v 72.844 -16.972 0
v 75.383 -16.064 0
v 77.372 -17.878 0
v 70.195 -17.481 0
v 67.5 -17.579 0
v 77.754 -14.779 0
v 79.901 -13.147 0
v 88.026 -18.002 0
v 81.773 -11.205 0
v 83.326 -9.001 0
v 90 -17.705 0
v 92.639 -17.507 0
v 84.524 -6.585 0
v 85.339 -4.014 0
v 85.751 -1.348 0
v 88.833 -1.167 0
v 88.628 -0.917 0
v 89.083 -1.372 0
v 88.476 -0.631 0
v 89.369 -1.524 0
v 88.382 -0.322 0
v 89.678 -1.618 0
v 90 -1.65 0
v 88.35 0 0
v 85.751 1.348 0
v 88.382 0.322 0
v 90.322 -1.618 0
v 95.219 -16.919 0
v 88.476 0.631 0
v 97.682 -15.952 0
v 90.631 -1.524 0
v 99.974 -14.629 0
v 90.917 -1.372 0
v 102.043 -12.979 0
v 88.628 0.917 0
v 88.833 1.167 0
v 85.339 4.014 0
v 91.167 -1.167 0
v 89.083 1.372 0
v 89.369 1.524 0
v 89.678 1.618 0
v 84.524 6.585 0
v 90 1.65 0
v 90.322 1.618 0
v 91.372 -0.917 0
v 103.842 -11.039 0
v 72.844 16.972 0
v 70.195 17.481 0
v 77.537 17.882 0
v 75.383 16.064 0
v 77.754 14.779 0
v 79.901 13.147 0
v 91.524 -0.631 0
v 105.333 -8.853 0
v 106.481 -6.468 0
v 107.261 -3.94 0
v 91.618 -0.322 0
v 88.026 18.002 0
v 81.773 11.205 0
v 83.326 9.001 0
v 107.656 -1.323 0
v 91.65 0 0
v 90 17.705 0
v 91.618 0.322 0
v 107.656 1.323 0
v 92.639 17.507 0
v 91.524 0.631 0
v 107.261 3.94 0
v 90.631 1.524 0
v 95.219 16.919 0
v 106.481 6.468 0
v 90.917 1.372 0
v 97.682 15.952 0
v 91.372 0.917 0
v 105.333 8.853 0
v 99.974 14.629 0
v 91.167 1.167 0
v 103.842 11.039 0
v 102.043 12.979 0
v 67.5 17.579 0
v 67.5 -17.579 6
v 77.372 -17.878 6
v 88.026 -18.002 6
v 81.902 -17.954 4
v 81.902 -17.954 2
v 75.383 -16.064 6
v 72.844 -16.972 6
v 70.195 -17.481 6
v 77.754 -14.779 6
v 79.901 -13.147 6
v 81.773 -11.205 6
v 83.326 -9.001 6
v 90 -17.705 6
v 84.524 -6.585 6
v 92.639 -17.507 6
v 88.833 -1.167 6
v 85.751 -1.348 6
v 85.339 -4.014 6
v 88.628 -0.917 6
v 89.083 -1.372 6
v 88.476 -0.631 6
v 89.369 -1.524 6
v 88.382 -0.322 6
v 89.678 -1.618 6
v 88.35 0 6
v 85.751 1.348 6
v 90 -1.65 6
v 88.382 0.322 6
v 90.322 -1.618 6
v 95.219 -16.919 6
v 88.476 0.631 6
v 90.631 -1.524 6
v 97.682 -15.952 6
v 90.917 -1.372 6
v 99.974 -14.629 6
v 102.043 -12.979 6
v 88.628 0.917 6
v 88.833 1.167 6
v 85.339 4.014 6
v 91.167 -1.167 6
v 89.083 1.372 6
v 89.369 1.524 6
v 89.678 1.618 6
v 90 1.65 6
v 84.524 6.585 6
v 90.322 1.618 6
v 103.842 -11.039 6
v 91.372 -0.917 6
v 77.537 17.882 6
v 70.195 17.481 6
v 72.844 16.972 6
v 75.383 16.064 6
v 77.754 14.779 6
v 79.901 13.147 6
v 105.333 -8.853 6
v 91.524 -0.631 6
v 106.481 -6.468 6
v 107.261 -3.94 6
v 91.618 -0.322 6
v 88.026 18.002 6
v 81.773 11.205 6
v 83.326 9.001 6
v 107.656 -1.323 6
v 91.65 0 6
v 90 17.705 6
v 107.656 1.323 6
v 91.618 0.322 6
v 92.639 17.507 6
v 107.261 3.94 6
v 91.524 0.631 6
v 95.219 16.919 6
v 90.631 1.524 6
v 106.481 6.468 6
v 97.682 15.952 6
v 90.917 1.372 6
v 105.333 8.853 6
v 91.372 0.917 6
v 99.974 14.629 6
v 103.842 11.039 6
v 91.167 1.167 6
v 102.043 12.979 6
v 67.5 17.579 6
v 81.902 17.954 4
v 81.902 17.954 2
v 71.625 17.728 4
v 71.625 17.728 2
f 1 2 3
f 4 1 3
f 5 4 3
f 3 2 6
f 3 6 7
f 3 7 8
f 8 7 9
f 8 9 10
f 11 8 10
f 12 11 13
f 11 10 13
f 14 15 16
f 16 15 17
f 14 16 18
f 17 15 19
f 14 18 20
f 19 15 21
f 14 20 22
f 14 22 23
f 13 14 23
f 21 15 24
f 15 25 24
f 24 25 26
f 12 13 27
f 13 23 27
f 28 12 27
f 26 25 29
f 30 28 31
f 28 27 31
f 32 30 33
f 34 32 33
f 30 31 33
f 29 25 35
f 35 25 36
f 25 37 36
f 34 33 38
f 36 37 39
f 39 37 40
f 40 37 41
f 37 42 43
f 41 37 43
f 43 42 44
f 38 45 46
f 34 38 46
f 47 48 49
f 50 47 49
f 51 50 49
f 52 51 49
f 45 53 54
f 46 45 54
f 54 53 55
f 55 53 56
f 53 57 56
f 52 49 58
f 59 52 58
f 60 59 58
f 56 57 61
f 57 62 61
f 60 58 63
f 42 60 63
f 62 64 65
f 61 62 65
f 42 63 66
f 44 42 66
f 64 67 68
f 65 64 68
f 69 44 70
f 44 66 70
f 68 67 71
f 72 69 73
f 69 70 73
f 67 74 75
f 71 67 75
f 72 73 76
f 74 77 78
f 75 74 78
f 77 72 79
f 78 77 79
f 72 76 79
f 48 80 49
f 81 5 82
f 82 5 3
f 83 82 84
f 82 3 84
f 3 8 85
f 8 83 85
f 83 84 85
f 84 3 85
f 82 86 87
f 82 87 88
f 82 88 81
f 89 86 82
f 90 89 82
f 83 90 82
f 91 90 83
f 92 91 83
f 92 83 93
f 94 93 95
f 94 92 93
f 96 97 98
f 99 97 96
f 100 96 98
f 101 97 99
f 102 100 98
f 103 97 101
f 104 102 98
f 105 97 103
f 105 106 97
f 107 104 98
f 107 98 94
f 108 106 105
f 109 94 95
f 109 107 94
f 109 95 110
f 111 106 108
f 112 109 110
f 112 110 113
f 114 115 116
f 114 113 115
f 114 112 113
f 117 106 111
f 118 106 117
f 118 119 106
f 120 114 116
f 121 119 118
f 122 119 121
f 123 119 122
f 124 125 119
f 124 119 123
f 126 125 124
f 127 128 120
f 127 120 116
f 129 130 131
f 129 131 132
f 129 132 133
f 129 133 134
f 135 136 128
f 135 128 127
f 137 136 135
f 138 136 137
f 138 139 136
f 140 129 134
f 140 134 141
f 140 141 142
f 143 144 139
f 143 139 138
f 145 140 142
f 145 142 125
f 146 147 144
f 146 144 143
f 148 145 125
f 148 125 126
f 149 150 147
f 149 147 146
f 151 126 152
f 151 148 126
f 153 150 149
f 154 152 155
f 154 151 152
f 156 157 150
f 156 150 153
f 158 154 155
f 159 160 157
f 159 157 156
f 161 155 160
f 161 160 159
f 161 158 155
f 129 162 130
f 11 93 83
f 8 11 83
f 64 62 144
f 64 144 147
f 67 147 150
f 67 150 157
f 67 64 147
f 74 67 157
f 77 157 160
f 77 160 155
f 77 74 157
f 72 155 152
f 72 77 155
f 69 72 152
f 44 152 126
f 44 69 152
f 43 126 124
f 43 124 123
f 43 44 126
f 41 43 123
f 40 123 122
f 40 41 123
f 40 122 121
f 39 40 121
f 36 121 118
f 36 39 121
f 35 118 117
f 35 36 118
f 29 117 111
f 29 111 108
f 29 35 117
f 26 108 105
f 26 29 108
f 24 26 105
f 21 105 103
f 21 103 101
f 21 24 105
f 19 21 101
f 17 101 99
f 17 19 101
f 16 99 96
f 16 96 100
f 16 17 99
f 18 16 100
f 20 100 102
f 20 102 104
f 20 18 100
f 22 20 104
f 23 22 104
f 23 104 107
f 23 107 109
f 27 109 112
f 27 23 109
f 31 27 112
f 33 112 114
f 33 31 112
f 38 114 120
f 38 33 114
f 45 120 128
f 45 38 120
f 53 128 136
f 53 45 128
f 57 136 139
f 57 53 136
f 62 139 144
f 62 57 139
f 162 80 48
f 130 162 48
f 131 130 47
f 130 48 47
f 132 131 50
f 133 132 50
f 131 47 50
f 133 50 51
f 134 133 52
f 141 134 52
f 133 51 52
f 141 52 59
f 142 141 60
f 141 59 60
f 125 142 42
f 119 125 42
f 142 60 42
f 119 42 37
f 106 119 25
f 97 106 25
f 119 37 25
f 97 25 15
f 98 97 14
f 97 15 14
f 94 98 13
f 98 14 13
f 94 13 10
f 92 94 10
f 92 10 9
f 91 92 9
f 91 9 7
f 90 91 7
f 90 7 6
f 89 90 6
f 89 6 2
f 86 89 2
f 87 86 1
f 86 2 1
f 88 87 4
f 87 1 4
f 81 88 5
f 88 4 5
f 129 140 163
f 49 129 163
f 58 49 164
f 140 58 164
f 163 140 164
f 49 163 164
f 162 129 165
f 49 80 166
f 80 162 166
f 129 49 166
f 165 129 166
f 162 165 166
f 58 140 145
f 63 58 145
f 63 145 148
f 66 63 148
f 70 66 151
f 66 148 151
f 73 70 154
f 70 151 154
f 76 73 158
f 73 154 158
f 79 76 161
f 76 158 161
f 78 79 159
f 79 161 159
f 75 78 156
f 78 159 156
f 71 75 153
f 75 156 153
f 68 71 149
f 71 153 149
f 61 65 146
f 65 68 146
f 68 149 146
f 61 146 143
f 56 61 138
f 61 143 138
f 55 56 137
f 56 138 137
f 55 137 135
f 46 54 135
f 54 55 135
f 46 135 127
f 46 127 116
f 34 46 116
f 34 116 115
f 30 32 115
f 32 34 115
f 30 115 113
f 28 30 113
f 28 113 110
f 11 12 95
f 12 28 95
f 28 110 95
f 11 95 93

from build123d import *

# Parameters (mm, degrees)
SKETCH2_R           = 1.65
BOSS_EXTRUDE1_DEPTH = 6
CUT_EXTRUDE1_DEPTH  = 110.659974352


with BuildPart() as part:
    # Sketch2 → Boss-Extrude1 (new body)
    with BuildSketch(Plane.XY):
        with BuildLine():
            ThreePointArc((90, -18.005197753), (108.005197753, 0), (90, 18.005197753))
            add(Edge.make_bspline(
                [(90, 18.005197753), (87.300427685, 18.005389985), (81.17457593, 17.968478919), (73.674128402, 17.806885767), (68.874876564, 17.634447138), (67.5, 17.578928476)],
                knots=[0.344744853, 0.344744853, 0.344744853, 0.344744853, 0.357984483, 0.374788114, 0.381536428, 0.381536428, 0.381536428, 0.381536428], degree=3))
            ThreePointArc((67.5, 17.578928476), (85.803106629, 0), (67.5, -17.578928476))
            add(Edge.make_bspline(
                [(67.5, -17.578928476), (68.874876564, -17.634447138), (73.674128402, -17.806885767), (81.17457593, -17.968478919), (87.300427685, -18.005389985), (90, -18.005197753)],
                knots=[0.618463572, 0.618463572, 0.618463572, 0.618463572, 0.625211886, 0.642015517, 0.655255147, 0.655255147, 0.655255147, 0.655255147], degree=3))
        make_face()
        with Locations((90, 0)):
            Circle(SKETCH2_R, mode=Mode.SUBTRACT)
    extrude(amount=BOSS_EXTRUDE1_DEPTH)

    # Sketch3 → Cut-Extrude1 (cut, through all)
    with BuildSketch(Plane.XY.offset(6)):
        with BuildLine():
            Line((88.025921382, 18.002375731), (90, 17.705197753))
            ThreePointArc((90, 17.705197753), (107.705197753, 0), (90, -17.705197753))
            Line((90, -17.705197753), (88.025921382, -18.002375731))
            add(Edge.make_bspline(
                [(88.025921382, -18.002375731), (88.683945552, -18.004313587), (89.341972833, -18.00524461), (90, -18.005197753)],
                knots=[0.652027956, 0.652027956, 0.652027956, 0.652027956, 0.655255147, 0.655255147, 0.655255147, 0.655255147], degree=3))
            ThreePointArc((90, -18.005197753), (108.005197753, 0), (90, 18.005197753))
            add(Edge.make_bspline(
                [(90, 18.005197753), (89.341972833, 18.00524461), (88.683945552, 18.004313587), (88.025921382, 18.002375731)],
                knots=[0.344744853, 0.344744853, 0.344744853, 0.344744853, 0.347972044, 0.347972044, 0.347972044, 0.347972044], degree=3))
        make_face()
    extrude(amount=-CUT_EXTRUDE1_DEPTH, mode=Mode.SUBTRACT)


solid = part.part
